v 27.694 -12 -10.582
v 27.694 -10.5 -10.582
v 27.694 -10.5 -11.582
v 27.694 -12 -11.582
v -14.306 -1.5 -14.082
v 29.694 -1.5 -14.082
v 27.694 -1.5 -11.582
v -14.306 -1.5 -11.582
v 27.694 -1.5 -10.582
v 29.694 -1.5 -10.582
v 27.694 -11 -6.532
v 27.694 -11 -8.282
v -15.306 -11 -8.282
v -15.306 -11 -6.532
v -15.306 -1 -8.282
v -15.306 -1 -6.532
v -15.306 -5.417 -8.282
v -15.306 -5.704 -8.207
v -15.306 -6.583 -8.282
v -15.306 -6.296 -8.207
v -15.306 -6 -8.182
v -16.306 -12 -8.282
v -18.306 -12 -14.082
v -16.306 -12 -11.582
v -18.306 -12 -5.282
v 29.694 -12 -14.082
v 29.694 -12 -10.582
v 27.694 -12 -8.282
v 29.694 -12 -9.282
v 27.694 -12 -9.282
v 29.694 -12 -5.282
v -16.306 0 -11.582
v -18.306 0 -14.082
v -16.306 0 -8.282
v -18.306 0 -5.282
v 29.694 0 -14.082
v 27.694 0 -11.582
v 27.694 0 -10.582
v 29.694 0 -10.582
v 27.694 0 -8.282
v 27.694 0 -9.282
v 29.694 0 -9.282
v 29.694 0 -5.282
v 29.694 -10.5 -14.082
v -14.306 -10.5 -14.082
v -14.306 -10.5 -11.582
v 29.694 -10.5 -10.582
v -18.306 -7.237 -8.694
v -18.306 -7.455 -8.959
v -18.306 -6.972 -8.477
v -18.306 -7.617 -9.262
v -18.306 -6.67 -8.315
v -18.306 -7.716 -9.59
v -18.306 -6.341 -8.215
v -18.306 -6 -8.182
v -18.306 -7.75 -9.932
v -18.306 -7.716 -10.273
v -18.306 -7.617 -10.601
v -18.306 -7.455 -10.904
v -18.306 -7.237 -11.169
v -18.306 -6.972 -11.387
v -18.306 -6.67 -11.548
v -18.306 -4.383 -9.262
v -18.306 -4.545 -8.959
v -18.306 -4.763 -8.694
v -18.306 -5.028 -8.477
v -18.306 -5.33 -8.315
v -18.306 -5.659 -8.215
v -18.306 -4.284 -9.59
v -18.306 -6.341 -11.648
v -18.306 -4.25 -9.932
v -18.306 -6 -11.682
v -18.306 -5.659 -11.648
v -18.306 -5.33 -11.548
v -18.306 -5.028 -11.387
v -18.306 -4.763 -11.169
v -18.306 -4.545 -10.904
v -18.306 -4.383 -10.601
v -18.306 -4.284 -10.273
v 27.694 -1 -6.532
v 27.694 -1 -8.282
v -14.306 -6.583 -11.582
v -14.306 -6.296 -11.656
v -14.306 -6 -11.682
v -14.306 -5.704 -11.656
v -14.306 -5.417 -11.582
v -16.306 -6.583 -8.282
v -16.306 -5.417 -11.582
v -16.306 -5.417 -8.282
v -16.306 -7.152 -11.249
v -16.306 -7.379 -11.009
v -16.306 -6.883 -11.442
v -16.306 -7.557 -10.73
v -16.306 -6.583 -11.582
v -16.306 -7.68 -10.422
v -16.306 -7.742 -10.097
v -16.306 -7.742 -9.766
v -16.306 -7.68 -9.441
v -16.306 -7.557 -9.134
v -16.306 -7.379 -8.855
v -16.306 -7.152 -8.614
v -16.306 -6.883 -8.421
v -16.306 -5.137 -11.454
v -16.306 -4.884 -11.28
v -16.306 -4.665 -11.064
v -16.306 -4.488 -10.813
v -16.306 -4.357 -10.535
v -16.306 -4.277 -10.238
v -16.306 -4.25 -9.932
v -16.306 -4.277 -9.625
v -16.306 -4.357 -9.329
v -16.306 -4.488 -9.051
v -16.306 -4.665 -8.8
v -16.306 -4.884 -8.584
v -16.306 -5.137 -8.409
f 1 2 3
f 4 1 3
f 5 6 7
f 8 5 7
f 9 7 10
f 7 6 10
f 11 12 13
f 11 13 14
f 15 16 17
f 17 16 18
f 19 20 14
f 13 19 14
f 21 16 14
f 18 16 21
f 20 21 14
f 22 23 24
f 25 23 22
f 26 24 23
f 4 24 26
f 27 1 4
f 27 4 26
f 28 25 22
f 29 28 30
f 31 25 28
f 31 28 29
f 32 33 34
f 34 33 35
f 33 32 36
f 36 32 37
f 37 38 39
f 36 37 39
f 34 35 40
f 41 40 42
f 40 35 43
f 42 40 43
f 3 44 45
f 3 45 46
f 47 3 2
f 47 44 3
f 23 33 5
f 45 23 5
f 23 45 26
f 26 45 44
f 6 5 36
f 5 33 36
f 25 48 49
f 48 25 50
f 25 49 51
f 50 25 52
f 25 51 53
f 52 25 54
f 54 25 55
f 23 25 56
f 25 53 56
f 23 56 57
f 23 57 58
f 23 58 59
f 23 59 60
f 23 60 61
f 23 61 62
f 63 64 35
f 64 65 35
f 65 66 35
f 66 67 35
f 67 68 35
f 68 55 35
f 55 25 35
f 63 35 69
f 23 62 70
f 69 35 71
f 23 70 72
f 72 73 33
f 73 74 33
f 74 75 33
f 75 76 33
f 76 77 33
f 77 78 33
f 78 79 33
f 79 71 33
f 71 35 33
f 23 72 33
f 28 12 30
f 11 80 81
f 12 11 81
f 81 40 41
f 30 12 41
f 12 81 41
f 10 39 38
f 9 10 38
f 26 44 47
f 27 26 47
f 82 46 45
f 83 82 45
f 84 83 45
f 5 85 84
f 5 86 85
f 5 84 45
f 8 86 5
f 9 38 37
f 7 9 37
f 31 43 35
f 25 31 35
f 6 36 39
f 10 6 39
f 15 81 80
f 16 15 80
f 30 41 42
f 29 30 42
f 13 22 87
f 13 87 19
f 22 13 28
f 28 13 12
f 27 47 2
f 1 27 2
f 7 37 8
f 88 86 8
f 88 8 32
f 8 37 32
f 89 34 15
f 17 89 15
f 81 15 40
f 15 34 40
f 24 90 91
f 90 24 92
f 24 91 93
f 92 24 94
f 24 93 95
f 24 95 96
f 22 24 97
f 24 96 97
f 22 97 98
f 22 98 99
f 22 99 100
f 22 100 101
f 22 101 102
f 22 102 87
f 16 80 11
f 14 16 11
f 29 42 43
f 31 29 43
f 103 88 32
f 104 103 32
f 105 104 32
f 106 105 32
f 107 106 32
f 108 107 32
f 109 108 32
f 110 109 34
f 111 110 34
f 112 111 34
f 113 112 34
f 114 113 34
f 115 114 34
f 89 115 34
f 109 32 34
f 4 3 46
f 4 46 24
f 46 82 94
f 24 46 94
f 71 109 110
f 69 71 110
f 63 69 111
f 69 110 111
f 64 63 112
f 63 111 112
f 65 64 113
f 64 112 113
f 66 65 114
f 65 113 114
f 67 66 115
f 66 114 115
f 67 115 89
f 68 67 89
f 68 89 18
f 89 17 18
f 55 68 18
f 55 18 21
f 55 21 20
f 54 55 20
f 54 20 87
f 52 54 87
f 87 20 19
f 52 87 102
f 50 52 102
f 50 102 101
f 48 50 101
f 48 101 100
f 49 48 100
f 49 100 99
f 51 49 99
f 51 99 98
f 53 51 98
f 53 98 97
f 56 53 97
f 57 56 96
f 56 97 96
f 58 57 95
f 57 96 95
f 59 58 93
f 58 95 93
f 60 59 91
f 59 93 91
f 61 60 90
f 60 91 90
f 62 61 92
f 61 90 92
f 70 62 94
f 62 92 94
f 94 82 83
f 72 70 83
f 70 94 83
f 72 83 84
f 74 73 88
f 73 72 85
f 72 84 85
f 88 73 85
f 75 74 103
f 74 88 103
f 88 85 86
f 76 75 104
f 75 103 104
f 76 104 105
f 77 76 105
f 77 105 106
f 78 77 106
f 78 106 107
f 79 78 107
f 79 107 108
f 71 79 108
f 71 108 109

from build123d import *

# Parameters (mm, degrees)
F1_DEPTH = 12
F3_W     = 10
F3_H     = 2
F4_DEPTH = 43
F6_W     = 9
F6_H     = 4.75
F7_DEPTH = 69
F9_D     = 3.5
F9_DEPTH = 4
F9_TIP   = 1.0515060833


with BuildPart() as f1:
    # F0 (on Front) → F1 (new body)
    with BuildSketch(Plane.XZ):
        Polygon((29.6939597434, -5.2816280767), (-18.3060402566, -5.2816280767), (-18.3060402566, -14.0816280767), (29.6939597434, -14.0816280767), (29.6939597434, -10.5816280767), (27.6939597434, -10.5816280767), (27.6939597434, -11.5816280767), (-16.3060402566, -11.5816280767), (-16.3060402566, -8.2816280767), (27.6939597434, -8.2816280767), (27.6939597434, -9.2816280767), (29.6939597434, -9.2816280767), align=None)
    extrude(amount=F1_DEPTH)

    # F3 (on offset) → F4 (cut)
    with BuildSketch(Plane(origin=(27.6939597434, 0, 0), x_dir=(0, -1, 0), z_dir=(-1, 0, 0))):
        with Locations((6, -7.5316280767)):
            Rectangle(F3_W, F3_H)
    extrude(amount=F4_DEPTH, mode=Mode.SUBTRACT)

    # F6 (on offset) → F7 (cut)
    with BuildSketch(Plane.YZ.offset(54.6939597434)):
        with Locations((-6, -12.9234550223)):
            Rectangle(F6_W, F6_H)
    extrude(amount=-F7_DEPTH, mode=Mode.SUBTRACT)

    # F9
    with Locations(Plane(origin=(-18.3060402566, 0, 0), x_dir=(0, -1, 0), z_dir=(-1, 0, 0))):
        with Locations((6, -9.9316280767)):
            Hole(F9_D / 2, depth=F9_DEPTH)
            with Locations((0, 0, -(F9_DEPTH + F9_TIP / 2))):  # 118° drill point
                Cone(0, F9_D / 2, F9_TIP, mode=Mode.SUBTRACT)


solid = f1.part
